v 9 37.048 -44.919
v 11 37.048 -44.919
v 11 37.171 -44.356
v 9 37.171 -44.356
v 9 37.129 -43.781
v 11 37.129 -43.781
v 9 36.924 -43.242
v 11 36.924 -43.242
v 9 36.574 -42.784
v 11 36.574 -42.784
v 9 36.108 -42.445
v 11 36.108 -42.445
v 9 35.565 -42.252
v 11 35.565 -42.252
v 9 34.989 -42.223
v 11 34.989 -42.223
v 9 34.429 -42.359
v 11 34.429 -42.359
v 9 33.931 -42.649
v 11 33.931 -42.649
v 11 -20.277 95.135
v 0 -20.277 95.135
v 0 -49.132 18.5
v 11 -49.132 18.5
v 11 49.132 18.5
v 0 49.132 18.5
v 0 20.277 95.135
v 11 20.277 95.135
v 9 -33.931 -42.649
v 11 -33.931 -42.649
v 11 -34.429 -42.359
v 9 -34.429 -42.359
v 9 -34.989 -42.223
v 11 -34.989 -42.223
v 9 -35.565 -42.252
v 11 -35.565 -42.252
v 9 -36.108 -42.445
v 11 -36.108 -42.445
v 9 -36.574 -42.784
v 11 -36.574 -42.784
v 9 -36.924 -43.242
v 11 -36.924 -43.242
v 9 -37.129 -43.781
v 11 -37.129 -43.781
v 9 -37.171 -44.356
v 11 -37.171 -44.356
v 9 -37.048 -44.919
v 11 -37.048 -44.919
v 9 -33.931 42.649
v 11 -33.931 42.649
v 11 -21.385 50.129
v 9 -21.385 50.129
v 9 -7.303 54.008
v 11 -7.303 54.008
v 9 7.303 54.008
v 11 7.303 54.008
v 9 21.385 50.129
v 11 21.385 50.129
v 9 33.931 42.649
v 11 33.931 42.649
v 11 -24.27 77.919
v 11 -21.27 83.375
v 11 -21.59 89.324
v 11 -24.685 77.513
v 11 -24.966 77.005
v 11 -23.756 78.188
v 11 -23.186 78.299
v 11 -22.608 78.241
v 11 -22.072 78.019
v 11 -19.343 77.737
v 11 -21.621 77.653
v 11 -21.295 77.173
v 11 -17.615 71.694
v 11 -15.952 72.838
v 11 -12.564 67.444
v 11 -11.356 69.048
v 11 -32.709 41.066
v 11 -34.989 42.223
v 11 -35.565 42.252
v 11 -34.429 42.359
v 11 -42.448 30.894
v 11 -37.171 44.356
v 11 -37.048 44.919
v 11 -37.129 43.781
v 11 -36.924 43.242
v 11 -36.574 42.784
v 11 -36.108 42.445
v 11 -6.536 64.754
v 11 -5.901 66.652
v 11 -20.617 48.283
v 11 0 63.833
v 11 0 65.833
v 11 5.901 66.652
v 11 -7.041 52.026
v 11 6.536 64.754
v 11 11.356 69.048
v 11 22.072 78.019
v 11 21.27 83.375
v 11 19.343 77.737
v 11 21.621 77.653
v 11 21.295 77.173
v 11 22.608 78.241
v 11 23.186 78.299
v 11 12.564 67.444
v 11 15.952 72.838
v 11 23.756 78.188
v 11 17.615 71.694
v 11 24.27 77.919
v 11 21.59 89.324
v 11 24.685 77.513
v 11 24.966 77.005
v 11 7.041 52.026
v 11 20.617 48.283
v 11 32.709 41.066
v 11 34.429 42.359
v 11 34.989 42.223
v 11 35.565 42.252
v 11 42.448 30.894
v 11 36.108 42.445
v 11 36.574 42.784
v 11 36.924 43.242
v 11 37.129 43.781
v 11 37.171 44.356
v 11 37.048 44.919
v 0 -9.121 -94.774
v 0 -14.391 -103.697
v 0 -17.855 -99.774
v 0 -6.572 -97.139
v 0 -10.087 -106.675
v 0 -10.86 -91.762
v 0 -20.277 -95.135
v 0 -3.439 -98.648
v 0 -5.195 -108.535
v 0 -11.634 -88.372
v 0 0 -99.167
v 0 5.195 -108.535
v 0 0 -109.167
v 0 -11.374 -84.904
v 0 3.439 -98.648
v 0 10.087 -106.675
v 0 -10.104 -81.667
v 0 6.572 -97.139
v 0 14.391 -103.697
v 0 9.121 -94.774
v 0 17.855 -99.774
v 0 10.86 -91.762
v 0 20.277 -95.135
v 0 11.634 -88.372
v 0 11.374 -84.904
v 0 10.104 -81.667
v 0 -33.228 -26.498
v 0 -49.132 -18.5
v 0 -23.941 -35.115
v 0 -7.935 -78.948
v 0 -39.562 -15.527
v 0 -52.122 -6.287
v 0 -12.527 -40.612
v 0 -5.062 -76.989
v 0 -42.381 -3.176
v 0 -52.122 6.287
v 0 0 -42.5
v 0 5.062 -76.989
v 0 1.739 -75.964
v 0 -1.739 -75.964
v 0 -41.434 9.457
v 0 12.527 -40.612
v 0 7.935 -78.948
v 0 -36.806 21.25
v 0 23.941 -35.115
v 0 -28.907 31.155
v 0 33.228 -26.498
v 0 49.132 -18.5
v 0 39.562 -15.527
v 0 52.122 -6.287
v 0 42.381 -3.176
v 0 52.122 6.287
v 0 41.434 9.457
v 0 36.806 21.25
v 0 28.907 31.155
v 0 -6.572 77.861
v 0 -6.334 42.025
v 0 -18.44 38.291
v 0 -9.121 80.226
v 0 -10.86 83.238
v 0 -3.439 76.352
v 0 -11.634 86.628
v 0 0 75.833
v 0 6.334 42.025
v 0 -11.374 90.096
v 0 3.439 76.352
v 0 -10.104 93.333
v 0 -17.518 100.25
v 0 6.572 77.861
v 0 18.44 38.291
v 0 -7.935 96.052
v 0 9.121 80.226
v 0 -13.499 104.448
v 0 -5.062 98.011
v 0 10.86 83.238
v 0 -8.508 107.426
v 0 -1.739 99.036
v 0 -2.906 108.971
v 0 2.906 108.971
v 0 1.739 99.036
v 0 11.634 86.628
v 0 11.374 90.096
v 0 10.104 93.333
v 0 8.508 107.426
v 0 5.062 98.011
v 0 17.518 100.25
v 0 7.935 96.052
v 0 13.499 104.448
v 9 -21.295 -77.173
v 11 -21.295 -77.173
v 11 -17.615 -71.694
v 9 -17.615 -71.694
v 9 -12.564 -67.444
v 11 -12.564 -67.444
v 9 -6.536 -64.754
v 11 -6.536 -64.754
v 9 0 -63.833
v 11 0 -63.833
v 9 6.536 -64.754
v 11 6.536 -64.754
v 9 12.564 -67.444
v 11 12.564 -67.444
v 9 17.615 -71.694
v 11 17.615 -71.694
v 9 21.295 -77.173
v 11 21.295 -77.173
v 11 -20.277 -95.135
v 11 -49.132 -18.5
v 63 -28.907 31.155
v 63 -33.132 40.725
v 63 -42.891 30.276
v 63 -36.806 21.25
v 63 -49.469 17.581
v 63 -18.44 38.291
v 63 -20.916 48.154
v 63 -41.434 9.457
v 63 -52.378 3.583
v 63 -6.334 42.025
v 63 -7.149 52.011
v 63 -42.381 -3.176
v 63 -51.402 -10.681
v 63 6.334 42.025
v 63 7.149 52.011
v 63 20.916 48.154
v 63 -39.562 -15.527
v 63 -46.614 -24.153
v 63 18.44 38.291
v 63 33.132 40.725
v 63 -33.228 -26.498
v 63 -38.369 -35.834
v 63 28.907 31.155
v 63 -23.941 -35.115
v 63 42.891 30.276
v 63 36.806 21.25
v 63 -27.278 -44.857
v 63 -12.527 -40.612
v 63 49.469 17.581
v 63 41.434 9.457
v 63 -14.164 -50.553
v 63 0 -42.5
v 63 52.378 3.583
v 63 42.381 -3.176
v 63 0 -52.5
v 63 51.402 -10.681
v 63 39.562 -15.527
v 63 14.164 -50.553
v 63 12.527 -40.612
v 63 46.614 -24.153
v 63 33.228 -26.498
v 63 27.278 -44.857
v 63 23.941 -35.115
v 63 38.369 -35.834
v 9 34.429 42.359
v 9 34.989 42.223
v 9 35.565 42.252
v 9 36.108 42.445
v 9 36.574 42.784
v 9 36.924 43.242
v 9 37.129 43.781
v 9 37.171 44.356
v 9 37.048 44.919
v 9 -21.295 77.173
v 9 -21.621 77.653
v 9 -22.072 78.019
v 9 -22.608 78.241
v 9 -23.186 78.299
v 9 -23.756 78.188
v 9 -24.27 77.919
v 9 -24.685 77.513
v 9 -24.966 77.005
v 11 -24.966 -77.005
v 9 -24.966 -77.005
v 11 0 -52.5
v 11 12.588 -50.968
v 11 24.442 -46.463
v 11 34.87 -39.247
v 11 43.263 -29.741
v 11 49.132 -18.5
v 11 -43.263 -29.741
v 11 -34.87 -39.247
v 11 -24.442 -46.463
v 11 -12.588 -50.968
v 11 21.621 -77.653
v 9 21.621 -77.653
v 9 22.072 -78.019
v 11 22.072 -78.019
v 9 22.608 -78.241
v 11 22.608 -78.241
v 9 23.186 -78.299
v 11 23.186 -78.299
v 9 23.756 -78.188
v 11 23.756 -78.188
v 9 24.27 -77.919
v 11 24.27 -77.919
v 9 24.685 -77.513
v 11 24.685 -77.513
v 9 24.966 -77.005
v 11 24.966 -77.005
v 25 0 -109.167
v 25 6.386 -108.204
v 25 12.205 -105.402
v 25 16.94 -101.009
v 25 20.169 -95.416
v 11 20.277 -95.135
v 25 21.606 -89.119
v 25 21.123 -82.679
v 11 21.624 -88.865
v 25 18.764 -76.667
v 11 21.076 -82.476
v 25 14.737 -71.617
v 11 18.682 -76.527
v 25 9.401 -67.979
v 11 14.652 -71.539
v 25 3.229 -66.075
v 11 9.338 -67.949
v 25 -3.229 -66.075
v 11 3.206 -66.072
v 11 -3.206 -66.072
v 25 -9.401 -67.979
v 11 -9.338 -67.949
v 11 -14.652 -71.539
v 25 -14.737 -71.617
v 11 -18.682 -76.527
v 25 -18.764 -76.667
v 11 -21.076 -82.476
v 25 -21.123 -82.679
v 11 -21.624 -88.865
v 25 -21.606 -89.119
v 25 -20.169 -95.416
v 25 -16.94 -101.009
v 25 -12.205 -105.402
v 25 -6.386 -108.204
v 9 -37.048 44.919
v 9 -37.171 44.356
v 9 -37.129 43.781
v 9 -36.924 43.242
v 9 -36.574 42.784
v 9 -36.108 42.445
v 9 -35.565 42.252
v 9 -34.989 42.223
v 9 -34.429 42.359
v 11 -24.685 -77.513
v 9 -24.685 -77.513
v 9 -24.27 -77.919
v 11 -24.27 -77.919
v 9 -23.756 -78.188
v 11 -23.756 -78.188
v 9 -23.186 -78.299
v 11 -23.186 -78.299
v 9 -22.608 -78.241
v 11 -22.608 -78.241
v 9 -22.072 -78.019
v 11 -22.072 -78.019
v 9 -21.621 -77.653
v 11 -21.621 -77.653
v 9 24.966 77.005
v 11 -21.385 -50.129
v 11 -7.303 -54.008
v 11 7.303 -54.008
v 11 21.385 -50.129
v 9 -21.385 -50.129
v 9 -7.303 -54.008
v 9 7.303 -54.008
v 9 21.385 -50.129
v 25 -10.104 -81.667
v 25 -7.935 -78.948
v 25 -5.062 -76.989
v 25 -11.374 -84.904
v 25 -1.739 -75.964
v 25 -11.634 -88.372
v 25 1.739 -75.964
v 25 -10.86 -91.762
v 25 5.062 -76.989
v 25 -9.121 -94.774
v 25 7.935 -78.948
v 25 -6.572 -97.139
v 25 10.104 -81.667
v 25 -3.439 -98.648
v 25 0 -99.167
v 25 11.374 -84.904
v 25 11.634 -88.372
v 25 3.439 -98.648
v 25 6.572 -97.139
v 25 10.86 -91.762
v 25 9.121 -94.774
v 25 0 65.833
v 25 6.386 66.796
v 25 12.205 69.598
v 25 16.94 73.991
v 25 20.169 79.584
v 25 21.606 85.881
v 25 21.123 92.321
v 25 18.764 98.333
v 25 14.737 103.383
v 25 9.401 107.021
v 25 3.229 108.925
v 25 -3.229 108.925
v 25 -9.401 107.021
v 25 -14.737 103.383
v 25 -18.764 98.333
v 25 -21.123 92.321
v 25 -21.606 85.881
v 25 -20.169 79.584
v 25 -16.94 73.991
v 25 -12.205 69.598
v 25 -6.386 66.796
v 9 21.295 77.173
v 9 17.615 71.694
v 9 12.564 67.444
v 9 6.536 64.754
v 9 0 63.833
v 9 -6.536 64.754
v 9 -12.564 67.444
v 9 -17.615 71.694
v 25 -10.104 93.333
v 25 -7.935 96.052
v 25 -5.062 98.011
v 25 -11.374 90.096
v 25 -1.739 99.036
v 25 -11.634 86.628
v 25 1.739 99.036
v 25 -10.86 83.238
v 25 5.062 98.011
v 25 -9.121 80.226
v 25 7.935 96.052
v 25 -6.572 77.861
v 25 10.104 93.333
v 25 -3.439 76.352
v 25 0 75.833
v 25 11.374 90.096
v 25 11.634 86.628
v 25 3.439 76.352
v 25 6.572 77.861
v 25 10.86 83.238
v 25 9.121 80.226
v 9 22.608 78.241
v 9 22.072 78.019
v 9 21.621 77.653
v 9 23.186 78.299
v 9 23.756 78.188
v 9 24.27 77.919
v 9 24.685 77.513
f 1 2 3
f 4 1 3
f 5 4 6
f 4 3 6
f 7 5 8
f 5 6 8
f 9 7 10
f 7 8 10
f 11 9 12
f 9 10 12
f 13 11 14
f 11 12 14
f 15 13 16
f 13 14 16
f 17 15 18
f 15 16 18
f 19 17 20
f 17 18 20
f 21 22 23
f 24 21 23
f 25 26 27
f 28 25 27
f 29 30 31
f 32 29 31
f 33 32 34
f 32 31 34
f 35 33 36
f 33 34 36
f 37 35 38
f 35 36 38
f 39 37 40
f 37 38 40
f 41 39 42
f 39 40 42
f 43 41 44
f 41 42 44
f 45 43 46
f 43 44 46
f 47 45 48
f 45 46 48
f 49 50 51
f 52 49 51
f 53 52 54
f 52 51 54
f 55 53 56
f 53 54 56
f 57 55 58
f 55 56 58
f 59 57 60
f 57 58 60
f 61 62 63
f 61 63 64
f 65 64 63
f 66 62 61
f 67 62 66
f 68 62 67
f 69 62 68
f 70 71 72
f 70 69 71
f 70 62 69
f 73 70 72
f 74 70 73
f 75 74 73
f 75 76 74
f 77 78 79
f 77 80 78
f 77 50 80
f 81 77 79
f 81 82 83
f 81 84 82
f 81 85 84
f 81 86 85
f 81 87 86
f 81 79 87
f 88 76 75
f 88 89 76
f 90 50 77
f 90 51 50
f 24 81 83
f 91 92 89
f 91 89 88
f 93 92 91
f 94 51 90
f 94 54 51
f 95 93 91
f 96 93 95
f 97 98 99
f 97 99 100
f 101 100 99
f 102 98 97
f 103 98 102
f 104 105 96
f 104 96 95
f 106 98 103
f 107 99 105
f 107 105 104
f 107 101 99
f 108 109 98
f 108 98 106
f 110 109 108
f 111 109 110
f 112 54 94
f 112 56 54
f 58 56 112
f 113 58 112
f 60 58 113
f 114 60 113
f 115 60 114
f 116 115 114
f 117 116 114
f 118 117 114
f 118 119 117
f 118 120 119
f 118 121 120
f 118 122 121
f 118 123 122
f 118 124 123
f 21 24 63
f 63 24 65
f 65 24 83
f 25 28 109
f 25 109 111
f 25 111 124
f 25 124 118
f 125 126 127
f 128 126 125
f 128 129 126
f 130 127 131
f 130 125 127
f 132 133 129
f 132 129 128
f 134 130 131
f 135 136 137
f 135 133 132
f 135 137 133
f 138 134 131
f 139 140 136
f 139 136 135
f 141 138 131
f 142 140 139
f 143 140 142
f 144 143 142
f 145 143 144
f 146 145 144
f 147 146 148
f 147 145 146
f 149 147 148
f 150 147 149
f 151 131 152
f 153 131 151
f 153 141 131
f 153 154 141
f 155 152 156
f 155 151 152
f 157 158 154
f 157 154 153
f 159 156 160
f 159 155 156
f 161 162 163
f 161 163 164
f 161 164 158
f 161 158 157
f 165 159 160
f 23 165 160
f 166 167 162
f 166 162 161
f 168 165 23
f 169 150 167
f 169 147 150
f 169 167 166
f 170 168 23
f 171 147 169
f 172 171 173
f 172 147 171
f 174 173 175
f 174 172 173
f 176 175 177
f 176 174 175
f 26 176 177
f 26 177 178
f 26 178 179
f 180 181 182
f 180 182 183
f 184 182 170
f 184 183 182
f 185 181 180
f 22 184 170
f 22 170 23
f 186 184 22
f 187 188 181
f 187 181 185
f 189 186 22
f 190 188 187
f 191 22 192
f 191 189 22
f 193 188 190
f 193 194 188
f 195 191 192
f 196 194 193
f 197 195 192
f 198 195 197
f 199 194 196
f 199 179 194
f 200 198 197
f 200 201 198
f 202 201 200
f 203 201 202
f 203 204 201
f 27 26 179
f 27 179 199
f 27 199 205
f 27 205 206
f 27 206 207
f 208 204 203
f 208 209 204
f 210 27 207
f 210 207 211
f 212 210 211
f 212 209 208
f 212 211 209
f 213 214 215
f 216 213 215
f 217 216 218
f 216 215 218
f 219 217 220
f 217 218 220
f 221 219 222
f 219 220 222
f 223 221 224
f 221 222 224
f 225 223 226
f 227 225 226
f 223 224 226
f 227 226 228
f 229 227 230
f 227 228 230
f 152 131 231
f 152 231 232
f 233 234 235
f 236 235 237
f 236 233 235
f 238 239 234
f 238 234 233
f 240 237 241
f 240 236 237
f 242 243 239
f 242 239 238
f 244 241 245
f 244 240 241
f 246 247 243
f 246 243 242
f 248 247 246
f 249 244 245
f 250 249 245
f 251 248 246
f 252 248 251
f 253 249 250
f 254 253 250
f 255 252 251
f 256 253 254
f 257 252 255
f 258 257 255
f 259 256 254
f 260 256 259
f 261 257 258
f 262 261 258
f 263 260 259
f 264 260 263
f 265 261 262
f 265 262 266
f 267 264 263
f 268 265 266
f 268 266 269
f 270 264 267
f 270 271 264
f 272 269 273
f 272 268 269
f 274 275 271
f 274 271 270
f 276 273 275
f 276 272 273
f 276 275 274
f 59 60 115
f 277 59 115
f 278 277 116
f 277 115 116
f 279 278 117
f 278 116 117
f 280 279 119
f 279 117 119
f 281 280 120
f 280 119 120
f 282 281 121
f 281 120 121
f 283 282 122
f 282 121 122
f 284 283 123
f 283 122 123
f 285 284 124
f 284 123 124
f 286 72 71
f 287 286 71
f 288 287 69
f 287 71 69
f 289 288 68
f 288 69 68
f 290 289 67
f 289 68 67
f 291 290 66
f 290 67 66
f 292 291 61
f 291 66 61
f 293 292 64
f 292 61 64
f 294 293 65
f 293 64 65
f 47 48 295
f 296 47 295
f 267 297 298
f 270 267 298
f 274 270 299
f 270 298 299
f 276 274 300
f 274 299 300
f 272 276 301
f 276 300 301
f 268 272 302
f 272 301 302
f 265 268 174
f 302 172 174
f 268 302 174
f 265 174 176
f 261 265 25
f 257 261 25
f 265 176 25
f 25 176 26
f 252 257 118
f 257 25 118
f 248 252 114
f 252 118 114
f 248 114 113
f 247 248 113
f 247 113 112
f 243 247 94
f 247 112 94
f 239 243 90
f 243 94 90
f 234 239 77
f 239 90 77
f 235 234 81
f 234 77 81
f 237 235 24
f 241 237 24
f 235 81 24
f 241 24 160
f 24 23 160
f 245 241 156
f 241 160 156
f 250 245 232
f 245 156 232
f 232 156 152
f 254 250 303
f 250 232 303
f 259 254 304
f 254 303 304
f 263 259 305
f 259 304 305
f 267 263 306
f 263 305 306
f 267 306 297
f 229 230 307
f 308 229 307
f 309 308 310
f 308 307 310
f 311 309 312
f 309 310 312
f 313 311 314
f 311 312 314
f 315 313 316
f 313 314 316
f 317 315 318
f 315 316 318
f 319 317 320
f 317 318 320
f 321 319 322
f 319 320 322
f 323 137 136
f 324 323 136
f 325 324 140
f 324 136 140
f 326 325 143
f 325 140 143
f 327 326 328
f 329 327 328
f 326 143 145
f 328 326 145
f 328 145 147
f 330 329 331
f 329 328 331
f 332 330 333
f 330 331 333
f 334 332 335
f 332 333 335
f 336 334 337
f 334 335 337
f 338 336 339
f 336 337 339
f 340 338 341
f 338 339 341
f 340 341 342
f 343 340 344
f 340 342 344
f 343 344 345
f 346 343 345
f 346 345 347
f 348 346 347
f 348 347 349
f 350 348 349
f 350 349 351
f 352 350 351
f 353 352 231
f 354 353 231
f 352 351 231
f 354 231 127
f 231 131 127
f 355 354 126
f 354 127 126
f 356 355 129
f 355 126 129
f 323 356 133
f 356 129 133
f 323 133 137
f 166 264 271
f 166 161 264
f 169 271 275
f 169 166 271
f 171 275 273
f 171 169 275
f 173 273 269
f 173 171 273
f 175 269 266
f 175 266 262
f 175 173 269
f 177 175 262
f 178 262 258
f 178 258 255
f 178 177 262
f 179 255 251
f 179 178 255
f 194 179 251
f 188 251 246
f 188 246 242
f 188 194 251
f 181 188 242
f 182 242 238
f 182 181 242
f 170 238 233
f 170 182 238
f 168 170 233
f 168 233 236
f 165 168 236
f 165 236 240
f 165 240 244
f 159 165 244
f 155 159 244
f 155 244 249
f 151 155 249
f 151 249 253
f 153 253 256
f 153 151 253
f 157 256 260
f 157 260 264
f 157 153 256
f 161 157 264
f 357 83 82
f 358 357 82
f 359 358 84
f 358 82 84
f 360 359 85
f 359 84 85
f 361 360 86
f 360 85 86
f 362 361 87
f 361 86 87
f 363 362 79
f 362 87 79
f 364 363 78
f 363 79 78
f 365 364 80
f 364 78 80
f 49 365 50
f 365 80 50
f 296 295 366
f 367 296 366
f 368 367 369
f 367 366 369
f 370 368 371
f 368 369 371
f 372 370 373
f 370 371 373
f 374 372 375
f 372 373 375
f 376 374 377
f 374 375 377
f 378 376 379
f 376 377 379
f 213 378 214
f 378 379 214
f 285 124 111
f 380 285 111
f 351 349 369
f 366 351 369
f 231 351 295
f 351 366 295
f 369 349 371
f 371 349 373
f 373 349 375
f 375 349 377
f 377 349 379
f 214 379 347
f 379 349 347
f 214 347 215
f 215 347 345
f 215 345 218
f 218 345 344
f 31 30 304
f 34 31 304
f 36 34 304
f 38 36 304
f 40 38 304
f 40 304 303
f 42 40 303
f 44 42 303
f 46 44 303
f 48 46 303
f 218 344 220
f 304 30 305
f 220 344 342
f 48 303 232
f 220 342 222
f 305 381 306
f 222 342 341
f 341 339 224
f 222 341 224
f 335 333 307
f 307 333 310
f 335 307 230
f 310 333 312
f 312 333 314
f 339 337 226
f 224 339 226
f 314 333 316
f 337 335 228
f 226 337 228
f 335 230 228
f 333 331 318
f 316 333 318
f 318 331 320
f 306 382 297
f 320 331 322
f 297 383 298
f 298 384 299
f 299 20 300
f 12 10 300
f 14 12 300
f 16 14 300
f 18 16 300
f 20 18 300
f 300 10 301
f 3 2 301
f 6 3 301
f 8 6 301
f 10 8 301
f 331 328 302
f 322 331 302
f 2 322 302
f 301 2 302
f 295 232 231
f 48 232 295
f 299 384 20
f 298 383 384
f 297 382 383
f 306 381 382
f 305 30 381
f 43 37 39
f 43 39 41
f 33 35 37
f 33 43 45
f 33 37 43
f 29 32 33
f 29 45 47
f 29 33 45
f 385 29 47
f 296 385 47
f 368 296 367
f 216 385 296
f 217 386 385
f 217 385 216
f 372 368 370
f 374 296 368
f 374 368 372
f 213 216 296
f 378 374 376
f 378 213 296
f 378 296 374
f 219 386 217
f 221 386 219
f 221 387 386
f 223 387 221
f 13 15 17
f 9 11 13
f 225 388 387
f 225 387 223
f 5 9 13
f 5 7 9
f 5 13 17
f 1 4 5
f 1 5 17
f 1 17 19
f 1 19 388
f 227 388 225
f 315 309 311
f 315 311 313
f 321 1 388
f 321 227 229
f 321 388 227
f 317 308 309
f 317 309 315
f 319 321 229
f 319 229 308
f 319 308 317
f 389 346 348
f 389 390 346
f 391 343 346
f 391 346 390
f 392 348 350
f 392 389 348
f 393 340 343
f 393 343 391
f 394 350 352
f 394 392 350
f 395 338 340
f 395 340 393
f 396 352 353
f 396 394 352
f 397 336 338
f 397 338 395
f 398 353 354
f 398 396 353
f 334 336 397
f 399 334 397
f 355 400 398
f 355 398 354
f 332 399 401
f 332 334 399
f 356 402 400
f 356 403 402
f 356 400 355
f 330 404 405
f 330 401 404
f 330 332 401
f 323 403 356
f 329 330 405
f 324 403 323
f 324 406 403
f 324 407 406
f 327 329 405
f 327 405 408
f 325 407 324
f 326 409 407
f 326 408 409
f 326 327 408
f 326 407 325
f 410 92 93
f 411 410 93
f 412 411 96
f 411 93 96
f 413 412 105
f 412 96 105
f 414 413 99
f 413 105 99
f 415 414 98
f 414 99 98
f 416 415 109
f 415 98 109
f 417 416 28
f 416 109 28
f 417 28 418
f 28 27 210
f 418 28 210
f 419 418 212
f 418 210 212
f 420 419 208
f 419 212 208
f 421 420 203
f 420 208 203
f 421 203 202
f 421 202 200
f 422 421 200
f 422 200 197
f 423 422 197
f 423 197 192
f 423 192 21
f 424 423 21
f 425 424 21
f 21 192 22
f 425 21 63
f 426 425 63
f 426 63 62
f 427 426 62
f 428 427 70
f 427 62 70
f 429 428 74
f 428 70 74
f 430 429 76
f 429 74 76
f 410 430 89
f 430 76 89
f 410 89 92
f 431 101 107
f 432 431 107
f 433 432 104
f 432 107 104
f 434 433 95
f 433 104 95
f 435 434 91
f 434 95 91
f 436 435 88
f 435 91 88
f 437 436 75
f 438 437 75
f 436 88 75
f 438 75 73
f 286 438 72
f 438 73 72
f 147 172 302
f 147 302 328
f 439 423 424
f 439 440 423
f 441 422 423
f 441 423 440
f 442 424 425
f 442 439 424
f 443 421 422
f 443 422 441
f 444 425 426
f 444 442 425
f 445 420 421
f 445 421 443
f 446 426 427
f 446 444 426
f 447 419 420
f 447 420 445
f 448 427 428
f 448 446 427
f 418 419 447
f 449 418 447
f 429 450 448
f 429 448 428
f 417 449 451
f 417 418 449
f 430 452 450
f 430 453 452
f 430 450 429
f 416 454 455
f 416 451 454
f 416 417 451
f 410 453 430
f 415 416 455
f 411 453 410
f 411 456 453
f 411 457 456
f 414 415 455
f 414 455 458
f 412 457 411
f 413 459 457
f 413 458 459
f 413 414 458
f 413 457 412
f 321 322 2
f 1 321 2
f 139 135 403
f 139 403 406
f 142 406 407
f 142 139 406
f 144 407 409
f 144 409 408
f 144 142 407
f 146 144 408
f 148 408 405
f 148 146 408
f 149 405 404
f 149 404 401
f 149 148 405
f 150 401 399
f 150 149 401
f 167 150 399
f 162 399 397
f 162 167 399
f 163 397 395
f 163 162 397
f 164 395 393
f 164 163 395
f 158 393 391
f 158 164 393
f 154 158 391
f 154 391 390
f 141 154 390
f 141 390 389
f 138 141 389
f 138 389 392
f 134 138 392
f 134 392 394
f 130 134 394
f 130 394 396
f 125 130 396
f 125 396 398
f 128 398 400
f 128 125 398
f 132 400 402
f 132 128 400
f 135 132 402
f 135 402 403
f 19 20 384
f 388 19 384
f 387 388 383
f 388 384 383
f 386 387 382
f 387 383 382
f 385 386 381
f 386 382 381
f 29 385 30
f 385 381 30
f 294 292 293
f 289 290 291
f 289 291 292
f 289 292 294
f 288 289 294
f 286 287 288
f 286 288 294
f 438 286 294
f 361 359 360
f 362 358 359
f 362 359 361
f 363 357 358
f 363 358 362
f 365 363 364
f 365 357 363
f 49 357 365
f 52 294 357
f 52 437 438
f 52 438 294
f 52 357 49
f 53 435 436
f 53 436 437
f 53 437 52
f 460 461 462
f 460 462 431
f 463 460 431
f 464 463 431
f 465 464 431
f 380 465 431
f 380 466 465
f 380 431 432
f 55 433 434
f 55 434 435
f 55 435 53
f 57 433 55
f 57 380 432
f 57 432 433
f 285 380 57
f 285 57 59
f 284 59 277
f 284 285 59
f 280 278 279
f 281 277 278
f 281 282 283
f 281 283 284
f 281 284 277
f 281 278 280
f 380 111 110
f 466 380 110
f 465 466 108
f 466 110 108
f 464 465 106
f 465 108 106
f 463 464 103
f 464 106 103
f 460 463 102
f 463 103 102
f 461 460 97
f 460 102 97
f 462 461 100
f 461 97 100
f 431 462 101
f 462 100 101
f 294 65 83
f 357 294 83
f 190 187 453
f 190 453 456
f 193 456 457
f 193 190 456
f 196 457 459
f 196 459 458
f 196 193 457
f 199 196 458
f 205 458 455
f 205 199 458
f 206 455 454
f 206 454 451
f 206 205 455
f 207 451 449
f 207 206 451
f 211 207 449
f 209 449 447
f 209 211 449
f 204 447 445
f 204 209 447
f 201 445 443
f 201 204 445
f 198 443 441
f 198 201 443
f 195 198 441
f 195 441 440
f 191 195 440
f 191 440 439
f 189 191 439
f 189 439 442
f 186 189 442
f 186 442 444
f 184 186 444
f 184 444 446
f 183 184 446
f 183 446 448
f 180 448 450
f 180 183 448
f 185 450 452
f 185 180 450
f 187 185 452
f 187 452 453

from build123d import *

# Parameters (mm, degrees)
SKETCH1_R             = 52.5
SKETCH1_R_2           = 42.5
BOSS_EXTRUDE1_DEPTH   = 25
SKETCH1_R_3           = 21.666666667
SKETCH1_R_4           = 11.666666667
BOSS_EXTRUDE1_2_DEPTH = 25
BOSS_EXTRUDE1_3_DEPTH = 25
SKETCH2_R             = 52.5
SKETCH2_R_2           = 42.5
BOSS_EXTRUDE2_DEPTH   = 38
BOSS_EXTRUDE3_DEPTH   = 11
CUT_EXTRUDE1_DEPTH    = 2


with BuildPart() as part:
    # Sketch1 → Boss-Extrude1 (new body)
    with BuildSketch(Plane(origin=(0, 0, 0), x_dir=(0, 0, -1), z_dir=(1, 0, 0))):
        Circle(SKETCH1_R)
        Circle(SKETCH1_R_2, mode=Mode.SUBTRACT)
    extrude(amount=BOSS_EXTRUDE1_DEPTH)

    # Sketch2 → Boss-Extrude2 (add)
    with BuildSketch(Plane(origin=(25, 0, 0), x_dir=(0, 0, -1), z_dir=(1, 0, 0))):
        Circle(SKETCH2_R)
        Circle(SKETCH2_R_2, mode=Mode.SUBTRACT)
    extrude(amount=BOSS_EXTRUDE2_DEPTH)



with BuildPart() as body_2:
    # Sketch1 → Boss-Extrude1 2 (new body)
    with BuildSketch(Plane(origin=(0, 0, 0), x_dir=(0, 0, -1), z_dir=(1, 0, 0))):
        with Locations((87.5, 0)):
            Circle(SKETCH1_R_3)
        with Locations((87.5, 0)):
            Circle(SKETCH1_R_4, mode=Mode.SUBTRACT)
    extrude(amount=BOSS_EXTRUDE1_2_DEPTH)


with BuildPart() as body_3:
    # Sketch1 → Boss-Extrude1 3 (new body)
    with BuildSketch(Plane(origin=(0, 0, 0), x_dir=(0, 0, -1), z_dir=(1, 0, 0))):
        with Locations((-87.5, 0)):
            Circle(SKETCH1_R_3)
        with Locations((-87.5, 0)):
            Circle(SKETCH1_R_4, mode=Mode.SUBTRACT)
    extrude(amount=BOSS_EXTRUDE1_3_DEPTH)


with BuildPart() as part_1:
    add(part.part)

    add(body_2.part)  # Boss-Extrude3 merges body 2

    add(body_3.part)  # Boss-Extrude3 merges body 3
    # Sketch4 → Boss-Extrude3 (add)
    with BuildSketch(Plane(origin=(0, 0, 0), x_dir=(0, 0, -1), z_dir=(1, 0, 0))):
        with BuildLine():
            Line((18.5, 49.132473986), (95.134920635, 20.276894026))
            ThreePointArc((95.134920635, 20.276894026), (65.833333333, 0), (95.134920635, -20.276894026))
            Line((95.134920635, -20.276894026), (18.5, -49.132473986))
            ThreePointArc((18.5, -49.132473986), (52.5, 0), (18.5, 49.132473986))
        make_face()
        with BuildLine():
            Line((-95.134920635, -20.276894026), (-18.5, -49.132473986))
            ThreePointArc((-18.5, -49.132473986), (-52.5, 0), (-18.5, 49.132473986))
            Line((-18.5, 49.132473986), (-95.134920635, 20.276894026))
            ThreePointArc((-95.134920635, 20.276894026), (-65.833333333, 0), (-95.134920635, -20.276894026))
        make_face()
    extrude(amount=BOSS_EXTRUDE3_DEPTH)

    # Sketch5 → Cut-Extrude1 (cut)
    with BuildSketch(Plane(origin=(11, 0, 0), x_dir=(0, 0, -1), z_dir=(1, 0, 0))):
        with BuildLine():
            Line((-77.005456237, -24.966157006), (-44.91894061, -37.047790413))
            ThreePointArc((-44.91894061, -37.047790413), (-42.59745711, -36.353451861), (-42.649075034, -33.930906247))
            ThreePointArc((-42.649075034, -33.930906247), (-54.5, 0), (-42.649075034, 33.930906247))
            ThreePointArc((-42.649075034, 33.930906247), (-42.59745711, 36.353451861), (-44.91894061, 37.047790413))
            Line((-44.91894061, 37.047790413), (-77.005456237, 24.966157006))
            ThreePointArc((-77.005456237, 24.966157006), (-78.298605787, 23.185821053), (-77.173367501, 21.294876669))
            ThreePointArc((-77.173367501, 21.294876669), (-63.833333333, 0), (-77.173367501, -21.294876669))
            ThreePointArc((-77.173367501, -21.294876669), (-78.298605787, -23.185821053), (-77.005456237, -24.966157006))
        make_face()
        with BuildLine():
            Line((77.005456237, 24.966157006), (44.91894061, 37.047790413))
            ThreePointArc((44.91894061, 37.047790413), (42.59745711, 36.353451861), (42.649075034, 33.930906247))
            ThreePointArc((42.649075034, 33.930906247), (54.5, 0), (42.649075034, -33.930906247))
            ThreePointArc((42.649075034, -33.930906247), (42.59745711, -36.353451861), (44.91894061, -37.047790413))
            Line((44.91894061, -37.047790413), (77.005456237, -24.966157006))
            ThreePointArc((77.005456237, -24.966157006), (78.298605787, -23.185821053), (77.173367501, -21.294876669))
            ThreePointArc((77.173367501, -21.294876669), (63.833333333, 0), (77.173367501, 21.294876669))
            ThreePointArc((77.173367501, 21.294876669), (78.298605787, 23.185821053), (77.005456237, 24.966157006))
        make_face()
    extrude(amount=-CUT_EXTRUDE1_DEPTH, mode=Mode.SUBTRACT)


solid = part_1.part
